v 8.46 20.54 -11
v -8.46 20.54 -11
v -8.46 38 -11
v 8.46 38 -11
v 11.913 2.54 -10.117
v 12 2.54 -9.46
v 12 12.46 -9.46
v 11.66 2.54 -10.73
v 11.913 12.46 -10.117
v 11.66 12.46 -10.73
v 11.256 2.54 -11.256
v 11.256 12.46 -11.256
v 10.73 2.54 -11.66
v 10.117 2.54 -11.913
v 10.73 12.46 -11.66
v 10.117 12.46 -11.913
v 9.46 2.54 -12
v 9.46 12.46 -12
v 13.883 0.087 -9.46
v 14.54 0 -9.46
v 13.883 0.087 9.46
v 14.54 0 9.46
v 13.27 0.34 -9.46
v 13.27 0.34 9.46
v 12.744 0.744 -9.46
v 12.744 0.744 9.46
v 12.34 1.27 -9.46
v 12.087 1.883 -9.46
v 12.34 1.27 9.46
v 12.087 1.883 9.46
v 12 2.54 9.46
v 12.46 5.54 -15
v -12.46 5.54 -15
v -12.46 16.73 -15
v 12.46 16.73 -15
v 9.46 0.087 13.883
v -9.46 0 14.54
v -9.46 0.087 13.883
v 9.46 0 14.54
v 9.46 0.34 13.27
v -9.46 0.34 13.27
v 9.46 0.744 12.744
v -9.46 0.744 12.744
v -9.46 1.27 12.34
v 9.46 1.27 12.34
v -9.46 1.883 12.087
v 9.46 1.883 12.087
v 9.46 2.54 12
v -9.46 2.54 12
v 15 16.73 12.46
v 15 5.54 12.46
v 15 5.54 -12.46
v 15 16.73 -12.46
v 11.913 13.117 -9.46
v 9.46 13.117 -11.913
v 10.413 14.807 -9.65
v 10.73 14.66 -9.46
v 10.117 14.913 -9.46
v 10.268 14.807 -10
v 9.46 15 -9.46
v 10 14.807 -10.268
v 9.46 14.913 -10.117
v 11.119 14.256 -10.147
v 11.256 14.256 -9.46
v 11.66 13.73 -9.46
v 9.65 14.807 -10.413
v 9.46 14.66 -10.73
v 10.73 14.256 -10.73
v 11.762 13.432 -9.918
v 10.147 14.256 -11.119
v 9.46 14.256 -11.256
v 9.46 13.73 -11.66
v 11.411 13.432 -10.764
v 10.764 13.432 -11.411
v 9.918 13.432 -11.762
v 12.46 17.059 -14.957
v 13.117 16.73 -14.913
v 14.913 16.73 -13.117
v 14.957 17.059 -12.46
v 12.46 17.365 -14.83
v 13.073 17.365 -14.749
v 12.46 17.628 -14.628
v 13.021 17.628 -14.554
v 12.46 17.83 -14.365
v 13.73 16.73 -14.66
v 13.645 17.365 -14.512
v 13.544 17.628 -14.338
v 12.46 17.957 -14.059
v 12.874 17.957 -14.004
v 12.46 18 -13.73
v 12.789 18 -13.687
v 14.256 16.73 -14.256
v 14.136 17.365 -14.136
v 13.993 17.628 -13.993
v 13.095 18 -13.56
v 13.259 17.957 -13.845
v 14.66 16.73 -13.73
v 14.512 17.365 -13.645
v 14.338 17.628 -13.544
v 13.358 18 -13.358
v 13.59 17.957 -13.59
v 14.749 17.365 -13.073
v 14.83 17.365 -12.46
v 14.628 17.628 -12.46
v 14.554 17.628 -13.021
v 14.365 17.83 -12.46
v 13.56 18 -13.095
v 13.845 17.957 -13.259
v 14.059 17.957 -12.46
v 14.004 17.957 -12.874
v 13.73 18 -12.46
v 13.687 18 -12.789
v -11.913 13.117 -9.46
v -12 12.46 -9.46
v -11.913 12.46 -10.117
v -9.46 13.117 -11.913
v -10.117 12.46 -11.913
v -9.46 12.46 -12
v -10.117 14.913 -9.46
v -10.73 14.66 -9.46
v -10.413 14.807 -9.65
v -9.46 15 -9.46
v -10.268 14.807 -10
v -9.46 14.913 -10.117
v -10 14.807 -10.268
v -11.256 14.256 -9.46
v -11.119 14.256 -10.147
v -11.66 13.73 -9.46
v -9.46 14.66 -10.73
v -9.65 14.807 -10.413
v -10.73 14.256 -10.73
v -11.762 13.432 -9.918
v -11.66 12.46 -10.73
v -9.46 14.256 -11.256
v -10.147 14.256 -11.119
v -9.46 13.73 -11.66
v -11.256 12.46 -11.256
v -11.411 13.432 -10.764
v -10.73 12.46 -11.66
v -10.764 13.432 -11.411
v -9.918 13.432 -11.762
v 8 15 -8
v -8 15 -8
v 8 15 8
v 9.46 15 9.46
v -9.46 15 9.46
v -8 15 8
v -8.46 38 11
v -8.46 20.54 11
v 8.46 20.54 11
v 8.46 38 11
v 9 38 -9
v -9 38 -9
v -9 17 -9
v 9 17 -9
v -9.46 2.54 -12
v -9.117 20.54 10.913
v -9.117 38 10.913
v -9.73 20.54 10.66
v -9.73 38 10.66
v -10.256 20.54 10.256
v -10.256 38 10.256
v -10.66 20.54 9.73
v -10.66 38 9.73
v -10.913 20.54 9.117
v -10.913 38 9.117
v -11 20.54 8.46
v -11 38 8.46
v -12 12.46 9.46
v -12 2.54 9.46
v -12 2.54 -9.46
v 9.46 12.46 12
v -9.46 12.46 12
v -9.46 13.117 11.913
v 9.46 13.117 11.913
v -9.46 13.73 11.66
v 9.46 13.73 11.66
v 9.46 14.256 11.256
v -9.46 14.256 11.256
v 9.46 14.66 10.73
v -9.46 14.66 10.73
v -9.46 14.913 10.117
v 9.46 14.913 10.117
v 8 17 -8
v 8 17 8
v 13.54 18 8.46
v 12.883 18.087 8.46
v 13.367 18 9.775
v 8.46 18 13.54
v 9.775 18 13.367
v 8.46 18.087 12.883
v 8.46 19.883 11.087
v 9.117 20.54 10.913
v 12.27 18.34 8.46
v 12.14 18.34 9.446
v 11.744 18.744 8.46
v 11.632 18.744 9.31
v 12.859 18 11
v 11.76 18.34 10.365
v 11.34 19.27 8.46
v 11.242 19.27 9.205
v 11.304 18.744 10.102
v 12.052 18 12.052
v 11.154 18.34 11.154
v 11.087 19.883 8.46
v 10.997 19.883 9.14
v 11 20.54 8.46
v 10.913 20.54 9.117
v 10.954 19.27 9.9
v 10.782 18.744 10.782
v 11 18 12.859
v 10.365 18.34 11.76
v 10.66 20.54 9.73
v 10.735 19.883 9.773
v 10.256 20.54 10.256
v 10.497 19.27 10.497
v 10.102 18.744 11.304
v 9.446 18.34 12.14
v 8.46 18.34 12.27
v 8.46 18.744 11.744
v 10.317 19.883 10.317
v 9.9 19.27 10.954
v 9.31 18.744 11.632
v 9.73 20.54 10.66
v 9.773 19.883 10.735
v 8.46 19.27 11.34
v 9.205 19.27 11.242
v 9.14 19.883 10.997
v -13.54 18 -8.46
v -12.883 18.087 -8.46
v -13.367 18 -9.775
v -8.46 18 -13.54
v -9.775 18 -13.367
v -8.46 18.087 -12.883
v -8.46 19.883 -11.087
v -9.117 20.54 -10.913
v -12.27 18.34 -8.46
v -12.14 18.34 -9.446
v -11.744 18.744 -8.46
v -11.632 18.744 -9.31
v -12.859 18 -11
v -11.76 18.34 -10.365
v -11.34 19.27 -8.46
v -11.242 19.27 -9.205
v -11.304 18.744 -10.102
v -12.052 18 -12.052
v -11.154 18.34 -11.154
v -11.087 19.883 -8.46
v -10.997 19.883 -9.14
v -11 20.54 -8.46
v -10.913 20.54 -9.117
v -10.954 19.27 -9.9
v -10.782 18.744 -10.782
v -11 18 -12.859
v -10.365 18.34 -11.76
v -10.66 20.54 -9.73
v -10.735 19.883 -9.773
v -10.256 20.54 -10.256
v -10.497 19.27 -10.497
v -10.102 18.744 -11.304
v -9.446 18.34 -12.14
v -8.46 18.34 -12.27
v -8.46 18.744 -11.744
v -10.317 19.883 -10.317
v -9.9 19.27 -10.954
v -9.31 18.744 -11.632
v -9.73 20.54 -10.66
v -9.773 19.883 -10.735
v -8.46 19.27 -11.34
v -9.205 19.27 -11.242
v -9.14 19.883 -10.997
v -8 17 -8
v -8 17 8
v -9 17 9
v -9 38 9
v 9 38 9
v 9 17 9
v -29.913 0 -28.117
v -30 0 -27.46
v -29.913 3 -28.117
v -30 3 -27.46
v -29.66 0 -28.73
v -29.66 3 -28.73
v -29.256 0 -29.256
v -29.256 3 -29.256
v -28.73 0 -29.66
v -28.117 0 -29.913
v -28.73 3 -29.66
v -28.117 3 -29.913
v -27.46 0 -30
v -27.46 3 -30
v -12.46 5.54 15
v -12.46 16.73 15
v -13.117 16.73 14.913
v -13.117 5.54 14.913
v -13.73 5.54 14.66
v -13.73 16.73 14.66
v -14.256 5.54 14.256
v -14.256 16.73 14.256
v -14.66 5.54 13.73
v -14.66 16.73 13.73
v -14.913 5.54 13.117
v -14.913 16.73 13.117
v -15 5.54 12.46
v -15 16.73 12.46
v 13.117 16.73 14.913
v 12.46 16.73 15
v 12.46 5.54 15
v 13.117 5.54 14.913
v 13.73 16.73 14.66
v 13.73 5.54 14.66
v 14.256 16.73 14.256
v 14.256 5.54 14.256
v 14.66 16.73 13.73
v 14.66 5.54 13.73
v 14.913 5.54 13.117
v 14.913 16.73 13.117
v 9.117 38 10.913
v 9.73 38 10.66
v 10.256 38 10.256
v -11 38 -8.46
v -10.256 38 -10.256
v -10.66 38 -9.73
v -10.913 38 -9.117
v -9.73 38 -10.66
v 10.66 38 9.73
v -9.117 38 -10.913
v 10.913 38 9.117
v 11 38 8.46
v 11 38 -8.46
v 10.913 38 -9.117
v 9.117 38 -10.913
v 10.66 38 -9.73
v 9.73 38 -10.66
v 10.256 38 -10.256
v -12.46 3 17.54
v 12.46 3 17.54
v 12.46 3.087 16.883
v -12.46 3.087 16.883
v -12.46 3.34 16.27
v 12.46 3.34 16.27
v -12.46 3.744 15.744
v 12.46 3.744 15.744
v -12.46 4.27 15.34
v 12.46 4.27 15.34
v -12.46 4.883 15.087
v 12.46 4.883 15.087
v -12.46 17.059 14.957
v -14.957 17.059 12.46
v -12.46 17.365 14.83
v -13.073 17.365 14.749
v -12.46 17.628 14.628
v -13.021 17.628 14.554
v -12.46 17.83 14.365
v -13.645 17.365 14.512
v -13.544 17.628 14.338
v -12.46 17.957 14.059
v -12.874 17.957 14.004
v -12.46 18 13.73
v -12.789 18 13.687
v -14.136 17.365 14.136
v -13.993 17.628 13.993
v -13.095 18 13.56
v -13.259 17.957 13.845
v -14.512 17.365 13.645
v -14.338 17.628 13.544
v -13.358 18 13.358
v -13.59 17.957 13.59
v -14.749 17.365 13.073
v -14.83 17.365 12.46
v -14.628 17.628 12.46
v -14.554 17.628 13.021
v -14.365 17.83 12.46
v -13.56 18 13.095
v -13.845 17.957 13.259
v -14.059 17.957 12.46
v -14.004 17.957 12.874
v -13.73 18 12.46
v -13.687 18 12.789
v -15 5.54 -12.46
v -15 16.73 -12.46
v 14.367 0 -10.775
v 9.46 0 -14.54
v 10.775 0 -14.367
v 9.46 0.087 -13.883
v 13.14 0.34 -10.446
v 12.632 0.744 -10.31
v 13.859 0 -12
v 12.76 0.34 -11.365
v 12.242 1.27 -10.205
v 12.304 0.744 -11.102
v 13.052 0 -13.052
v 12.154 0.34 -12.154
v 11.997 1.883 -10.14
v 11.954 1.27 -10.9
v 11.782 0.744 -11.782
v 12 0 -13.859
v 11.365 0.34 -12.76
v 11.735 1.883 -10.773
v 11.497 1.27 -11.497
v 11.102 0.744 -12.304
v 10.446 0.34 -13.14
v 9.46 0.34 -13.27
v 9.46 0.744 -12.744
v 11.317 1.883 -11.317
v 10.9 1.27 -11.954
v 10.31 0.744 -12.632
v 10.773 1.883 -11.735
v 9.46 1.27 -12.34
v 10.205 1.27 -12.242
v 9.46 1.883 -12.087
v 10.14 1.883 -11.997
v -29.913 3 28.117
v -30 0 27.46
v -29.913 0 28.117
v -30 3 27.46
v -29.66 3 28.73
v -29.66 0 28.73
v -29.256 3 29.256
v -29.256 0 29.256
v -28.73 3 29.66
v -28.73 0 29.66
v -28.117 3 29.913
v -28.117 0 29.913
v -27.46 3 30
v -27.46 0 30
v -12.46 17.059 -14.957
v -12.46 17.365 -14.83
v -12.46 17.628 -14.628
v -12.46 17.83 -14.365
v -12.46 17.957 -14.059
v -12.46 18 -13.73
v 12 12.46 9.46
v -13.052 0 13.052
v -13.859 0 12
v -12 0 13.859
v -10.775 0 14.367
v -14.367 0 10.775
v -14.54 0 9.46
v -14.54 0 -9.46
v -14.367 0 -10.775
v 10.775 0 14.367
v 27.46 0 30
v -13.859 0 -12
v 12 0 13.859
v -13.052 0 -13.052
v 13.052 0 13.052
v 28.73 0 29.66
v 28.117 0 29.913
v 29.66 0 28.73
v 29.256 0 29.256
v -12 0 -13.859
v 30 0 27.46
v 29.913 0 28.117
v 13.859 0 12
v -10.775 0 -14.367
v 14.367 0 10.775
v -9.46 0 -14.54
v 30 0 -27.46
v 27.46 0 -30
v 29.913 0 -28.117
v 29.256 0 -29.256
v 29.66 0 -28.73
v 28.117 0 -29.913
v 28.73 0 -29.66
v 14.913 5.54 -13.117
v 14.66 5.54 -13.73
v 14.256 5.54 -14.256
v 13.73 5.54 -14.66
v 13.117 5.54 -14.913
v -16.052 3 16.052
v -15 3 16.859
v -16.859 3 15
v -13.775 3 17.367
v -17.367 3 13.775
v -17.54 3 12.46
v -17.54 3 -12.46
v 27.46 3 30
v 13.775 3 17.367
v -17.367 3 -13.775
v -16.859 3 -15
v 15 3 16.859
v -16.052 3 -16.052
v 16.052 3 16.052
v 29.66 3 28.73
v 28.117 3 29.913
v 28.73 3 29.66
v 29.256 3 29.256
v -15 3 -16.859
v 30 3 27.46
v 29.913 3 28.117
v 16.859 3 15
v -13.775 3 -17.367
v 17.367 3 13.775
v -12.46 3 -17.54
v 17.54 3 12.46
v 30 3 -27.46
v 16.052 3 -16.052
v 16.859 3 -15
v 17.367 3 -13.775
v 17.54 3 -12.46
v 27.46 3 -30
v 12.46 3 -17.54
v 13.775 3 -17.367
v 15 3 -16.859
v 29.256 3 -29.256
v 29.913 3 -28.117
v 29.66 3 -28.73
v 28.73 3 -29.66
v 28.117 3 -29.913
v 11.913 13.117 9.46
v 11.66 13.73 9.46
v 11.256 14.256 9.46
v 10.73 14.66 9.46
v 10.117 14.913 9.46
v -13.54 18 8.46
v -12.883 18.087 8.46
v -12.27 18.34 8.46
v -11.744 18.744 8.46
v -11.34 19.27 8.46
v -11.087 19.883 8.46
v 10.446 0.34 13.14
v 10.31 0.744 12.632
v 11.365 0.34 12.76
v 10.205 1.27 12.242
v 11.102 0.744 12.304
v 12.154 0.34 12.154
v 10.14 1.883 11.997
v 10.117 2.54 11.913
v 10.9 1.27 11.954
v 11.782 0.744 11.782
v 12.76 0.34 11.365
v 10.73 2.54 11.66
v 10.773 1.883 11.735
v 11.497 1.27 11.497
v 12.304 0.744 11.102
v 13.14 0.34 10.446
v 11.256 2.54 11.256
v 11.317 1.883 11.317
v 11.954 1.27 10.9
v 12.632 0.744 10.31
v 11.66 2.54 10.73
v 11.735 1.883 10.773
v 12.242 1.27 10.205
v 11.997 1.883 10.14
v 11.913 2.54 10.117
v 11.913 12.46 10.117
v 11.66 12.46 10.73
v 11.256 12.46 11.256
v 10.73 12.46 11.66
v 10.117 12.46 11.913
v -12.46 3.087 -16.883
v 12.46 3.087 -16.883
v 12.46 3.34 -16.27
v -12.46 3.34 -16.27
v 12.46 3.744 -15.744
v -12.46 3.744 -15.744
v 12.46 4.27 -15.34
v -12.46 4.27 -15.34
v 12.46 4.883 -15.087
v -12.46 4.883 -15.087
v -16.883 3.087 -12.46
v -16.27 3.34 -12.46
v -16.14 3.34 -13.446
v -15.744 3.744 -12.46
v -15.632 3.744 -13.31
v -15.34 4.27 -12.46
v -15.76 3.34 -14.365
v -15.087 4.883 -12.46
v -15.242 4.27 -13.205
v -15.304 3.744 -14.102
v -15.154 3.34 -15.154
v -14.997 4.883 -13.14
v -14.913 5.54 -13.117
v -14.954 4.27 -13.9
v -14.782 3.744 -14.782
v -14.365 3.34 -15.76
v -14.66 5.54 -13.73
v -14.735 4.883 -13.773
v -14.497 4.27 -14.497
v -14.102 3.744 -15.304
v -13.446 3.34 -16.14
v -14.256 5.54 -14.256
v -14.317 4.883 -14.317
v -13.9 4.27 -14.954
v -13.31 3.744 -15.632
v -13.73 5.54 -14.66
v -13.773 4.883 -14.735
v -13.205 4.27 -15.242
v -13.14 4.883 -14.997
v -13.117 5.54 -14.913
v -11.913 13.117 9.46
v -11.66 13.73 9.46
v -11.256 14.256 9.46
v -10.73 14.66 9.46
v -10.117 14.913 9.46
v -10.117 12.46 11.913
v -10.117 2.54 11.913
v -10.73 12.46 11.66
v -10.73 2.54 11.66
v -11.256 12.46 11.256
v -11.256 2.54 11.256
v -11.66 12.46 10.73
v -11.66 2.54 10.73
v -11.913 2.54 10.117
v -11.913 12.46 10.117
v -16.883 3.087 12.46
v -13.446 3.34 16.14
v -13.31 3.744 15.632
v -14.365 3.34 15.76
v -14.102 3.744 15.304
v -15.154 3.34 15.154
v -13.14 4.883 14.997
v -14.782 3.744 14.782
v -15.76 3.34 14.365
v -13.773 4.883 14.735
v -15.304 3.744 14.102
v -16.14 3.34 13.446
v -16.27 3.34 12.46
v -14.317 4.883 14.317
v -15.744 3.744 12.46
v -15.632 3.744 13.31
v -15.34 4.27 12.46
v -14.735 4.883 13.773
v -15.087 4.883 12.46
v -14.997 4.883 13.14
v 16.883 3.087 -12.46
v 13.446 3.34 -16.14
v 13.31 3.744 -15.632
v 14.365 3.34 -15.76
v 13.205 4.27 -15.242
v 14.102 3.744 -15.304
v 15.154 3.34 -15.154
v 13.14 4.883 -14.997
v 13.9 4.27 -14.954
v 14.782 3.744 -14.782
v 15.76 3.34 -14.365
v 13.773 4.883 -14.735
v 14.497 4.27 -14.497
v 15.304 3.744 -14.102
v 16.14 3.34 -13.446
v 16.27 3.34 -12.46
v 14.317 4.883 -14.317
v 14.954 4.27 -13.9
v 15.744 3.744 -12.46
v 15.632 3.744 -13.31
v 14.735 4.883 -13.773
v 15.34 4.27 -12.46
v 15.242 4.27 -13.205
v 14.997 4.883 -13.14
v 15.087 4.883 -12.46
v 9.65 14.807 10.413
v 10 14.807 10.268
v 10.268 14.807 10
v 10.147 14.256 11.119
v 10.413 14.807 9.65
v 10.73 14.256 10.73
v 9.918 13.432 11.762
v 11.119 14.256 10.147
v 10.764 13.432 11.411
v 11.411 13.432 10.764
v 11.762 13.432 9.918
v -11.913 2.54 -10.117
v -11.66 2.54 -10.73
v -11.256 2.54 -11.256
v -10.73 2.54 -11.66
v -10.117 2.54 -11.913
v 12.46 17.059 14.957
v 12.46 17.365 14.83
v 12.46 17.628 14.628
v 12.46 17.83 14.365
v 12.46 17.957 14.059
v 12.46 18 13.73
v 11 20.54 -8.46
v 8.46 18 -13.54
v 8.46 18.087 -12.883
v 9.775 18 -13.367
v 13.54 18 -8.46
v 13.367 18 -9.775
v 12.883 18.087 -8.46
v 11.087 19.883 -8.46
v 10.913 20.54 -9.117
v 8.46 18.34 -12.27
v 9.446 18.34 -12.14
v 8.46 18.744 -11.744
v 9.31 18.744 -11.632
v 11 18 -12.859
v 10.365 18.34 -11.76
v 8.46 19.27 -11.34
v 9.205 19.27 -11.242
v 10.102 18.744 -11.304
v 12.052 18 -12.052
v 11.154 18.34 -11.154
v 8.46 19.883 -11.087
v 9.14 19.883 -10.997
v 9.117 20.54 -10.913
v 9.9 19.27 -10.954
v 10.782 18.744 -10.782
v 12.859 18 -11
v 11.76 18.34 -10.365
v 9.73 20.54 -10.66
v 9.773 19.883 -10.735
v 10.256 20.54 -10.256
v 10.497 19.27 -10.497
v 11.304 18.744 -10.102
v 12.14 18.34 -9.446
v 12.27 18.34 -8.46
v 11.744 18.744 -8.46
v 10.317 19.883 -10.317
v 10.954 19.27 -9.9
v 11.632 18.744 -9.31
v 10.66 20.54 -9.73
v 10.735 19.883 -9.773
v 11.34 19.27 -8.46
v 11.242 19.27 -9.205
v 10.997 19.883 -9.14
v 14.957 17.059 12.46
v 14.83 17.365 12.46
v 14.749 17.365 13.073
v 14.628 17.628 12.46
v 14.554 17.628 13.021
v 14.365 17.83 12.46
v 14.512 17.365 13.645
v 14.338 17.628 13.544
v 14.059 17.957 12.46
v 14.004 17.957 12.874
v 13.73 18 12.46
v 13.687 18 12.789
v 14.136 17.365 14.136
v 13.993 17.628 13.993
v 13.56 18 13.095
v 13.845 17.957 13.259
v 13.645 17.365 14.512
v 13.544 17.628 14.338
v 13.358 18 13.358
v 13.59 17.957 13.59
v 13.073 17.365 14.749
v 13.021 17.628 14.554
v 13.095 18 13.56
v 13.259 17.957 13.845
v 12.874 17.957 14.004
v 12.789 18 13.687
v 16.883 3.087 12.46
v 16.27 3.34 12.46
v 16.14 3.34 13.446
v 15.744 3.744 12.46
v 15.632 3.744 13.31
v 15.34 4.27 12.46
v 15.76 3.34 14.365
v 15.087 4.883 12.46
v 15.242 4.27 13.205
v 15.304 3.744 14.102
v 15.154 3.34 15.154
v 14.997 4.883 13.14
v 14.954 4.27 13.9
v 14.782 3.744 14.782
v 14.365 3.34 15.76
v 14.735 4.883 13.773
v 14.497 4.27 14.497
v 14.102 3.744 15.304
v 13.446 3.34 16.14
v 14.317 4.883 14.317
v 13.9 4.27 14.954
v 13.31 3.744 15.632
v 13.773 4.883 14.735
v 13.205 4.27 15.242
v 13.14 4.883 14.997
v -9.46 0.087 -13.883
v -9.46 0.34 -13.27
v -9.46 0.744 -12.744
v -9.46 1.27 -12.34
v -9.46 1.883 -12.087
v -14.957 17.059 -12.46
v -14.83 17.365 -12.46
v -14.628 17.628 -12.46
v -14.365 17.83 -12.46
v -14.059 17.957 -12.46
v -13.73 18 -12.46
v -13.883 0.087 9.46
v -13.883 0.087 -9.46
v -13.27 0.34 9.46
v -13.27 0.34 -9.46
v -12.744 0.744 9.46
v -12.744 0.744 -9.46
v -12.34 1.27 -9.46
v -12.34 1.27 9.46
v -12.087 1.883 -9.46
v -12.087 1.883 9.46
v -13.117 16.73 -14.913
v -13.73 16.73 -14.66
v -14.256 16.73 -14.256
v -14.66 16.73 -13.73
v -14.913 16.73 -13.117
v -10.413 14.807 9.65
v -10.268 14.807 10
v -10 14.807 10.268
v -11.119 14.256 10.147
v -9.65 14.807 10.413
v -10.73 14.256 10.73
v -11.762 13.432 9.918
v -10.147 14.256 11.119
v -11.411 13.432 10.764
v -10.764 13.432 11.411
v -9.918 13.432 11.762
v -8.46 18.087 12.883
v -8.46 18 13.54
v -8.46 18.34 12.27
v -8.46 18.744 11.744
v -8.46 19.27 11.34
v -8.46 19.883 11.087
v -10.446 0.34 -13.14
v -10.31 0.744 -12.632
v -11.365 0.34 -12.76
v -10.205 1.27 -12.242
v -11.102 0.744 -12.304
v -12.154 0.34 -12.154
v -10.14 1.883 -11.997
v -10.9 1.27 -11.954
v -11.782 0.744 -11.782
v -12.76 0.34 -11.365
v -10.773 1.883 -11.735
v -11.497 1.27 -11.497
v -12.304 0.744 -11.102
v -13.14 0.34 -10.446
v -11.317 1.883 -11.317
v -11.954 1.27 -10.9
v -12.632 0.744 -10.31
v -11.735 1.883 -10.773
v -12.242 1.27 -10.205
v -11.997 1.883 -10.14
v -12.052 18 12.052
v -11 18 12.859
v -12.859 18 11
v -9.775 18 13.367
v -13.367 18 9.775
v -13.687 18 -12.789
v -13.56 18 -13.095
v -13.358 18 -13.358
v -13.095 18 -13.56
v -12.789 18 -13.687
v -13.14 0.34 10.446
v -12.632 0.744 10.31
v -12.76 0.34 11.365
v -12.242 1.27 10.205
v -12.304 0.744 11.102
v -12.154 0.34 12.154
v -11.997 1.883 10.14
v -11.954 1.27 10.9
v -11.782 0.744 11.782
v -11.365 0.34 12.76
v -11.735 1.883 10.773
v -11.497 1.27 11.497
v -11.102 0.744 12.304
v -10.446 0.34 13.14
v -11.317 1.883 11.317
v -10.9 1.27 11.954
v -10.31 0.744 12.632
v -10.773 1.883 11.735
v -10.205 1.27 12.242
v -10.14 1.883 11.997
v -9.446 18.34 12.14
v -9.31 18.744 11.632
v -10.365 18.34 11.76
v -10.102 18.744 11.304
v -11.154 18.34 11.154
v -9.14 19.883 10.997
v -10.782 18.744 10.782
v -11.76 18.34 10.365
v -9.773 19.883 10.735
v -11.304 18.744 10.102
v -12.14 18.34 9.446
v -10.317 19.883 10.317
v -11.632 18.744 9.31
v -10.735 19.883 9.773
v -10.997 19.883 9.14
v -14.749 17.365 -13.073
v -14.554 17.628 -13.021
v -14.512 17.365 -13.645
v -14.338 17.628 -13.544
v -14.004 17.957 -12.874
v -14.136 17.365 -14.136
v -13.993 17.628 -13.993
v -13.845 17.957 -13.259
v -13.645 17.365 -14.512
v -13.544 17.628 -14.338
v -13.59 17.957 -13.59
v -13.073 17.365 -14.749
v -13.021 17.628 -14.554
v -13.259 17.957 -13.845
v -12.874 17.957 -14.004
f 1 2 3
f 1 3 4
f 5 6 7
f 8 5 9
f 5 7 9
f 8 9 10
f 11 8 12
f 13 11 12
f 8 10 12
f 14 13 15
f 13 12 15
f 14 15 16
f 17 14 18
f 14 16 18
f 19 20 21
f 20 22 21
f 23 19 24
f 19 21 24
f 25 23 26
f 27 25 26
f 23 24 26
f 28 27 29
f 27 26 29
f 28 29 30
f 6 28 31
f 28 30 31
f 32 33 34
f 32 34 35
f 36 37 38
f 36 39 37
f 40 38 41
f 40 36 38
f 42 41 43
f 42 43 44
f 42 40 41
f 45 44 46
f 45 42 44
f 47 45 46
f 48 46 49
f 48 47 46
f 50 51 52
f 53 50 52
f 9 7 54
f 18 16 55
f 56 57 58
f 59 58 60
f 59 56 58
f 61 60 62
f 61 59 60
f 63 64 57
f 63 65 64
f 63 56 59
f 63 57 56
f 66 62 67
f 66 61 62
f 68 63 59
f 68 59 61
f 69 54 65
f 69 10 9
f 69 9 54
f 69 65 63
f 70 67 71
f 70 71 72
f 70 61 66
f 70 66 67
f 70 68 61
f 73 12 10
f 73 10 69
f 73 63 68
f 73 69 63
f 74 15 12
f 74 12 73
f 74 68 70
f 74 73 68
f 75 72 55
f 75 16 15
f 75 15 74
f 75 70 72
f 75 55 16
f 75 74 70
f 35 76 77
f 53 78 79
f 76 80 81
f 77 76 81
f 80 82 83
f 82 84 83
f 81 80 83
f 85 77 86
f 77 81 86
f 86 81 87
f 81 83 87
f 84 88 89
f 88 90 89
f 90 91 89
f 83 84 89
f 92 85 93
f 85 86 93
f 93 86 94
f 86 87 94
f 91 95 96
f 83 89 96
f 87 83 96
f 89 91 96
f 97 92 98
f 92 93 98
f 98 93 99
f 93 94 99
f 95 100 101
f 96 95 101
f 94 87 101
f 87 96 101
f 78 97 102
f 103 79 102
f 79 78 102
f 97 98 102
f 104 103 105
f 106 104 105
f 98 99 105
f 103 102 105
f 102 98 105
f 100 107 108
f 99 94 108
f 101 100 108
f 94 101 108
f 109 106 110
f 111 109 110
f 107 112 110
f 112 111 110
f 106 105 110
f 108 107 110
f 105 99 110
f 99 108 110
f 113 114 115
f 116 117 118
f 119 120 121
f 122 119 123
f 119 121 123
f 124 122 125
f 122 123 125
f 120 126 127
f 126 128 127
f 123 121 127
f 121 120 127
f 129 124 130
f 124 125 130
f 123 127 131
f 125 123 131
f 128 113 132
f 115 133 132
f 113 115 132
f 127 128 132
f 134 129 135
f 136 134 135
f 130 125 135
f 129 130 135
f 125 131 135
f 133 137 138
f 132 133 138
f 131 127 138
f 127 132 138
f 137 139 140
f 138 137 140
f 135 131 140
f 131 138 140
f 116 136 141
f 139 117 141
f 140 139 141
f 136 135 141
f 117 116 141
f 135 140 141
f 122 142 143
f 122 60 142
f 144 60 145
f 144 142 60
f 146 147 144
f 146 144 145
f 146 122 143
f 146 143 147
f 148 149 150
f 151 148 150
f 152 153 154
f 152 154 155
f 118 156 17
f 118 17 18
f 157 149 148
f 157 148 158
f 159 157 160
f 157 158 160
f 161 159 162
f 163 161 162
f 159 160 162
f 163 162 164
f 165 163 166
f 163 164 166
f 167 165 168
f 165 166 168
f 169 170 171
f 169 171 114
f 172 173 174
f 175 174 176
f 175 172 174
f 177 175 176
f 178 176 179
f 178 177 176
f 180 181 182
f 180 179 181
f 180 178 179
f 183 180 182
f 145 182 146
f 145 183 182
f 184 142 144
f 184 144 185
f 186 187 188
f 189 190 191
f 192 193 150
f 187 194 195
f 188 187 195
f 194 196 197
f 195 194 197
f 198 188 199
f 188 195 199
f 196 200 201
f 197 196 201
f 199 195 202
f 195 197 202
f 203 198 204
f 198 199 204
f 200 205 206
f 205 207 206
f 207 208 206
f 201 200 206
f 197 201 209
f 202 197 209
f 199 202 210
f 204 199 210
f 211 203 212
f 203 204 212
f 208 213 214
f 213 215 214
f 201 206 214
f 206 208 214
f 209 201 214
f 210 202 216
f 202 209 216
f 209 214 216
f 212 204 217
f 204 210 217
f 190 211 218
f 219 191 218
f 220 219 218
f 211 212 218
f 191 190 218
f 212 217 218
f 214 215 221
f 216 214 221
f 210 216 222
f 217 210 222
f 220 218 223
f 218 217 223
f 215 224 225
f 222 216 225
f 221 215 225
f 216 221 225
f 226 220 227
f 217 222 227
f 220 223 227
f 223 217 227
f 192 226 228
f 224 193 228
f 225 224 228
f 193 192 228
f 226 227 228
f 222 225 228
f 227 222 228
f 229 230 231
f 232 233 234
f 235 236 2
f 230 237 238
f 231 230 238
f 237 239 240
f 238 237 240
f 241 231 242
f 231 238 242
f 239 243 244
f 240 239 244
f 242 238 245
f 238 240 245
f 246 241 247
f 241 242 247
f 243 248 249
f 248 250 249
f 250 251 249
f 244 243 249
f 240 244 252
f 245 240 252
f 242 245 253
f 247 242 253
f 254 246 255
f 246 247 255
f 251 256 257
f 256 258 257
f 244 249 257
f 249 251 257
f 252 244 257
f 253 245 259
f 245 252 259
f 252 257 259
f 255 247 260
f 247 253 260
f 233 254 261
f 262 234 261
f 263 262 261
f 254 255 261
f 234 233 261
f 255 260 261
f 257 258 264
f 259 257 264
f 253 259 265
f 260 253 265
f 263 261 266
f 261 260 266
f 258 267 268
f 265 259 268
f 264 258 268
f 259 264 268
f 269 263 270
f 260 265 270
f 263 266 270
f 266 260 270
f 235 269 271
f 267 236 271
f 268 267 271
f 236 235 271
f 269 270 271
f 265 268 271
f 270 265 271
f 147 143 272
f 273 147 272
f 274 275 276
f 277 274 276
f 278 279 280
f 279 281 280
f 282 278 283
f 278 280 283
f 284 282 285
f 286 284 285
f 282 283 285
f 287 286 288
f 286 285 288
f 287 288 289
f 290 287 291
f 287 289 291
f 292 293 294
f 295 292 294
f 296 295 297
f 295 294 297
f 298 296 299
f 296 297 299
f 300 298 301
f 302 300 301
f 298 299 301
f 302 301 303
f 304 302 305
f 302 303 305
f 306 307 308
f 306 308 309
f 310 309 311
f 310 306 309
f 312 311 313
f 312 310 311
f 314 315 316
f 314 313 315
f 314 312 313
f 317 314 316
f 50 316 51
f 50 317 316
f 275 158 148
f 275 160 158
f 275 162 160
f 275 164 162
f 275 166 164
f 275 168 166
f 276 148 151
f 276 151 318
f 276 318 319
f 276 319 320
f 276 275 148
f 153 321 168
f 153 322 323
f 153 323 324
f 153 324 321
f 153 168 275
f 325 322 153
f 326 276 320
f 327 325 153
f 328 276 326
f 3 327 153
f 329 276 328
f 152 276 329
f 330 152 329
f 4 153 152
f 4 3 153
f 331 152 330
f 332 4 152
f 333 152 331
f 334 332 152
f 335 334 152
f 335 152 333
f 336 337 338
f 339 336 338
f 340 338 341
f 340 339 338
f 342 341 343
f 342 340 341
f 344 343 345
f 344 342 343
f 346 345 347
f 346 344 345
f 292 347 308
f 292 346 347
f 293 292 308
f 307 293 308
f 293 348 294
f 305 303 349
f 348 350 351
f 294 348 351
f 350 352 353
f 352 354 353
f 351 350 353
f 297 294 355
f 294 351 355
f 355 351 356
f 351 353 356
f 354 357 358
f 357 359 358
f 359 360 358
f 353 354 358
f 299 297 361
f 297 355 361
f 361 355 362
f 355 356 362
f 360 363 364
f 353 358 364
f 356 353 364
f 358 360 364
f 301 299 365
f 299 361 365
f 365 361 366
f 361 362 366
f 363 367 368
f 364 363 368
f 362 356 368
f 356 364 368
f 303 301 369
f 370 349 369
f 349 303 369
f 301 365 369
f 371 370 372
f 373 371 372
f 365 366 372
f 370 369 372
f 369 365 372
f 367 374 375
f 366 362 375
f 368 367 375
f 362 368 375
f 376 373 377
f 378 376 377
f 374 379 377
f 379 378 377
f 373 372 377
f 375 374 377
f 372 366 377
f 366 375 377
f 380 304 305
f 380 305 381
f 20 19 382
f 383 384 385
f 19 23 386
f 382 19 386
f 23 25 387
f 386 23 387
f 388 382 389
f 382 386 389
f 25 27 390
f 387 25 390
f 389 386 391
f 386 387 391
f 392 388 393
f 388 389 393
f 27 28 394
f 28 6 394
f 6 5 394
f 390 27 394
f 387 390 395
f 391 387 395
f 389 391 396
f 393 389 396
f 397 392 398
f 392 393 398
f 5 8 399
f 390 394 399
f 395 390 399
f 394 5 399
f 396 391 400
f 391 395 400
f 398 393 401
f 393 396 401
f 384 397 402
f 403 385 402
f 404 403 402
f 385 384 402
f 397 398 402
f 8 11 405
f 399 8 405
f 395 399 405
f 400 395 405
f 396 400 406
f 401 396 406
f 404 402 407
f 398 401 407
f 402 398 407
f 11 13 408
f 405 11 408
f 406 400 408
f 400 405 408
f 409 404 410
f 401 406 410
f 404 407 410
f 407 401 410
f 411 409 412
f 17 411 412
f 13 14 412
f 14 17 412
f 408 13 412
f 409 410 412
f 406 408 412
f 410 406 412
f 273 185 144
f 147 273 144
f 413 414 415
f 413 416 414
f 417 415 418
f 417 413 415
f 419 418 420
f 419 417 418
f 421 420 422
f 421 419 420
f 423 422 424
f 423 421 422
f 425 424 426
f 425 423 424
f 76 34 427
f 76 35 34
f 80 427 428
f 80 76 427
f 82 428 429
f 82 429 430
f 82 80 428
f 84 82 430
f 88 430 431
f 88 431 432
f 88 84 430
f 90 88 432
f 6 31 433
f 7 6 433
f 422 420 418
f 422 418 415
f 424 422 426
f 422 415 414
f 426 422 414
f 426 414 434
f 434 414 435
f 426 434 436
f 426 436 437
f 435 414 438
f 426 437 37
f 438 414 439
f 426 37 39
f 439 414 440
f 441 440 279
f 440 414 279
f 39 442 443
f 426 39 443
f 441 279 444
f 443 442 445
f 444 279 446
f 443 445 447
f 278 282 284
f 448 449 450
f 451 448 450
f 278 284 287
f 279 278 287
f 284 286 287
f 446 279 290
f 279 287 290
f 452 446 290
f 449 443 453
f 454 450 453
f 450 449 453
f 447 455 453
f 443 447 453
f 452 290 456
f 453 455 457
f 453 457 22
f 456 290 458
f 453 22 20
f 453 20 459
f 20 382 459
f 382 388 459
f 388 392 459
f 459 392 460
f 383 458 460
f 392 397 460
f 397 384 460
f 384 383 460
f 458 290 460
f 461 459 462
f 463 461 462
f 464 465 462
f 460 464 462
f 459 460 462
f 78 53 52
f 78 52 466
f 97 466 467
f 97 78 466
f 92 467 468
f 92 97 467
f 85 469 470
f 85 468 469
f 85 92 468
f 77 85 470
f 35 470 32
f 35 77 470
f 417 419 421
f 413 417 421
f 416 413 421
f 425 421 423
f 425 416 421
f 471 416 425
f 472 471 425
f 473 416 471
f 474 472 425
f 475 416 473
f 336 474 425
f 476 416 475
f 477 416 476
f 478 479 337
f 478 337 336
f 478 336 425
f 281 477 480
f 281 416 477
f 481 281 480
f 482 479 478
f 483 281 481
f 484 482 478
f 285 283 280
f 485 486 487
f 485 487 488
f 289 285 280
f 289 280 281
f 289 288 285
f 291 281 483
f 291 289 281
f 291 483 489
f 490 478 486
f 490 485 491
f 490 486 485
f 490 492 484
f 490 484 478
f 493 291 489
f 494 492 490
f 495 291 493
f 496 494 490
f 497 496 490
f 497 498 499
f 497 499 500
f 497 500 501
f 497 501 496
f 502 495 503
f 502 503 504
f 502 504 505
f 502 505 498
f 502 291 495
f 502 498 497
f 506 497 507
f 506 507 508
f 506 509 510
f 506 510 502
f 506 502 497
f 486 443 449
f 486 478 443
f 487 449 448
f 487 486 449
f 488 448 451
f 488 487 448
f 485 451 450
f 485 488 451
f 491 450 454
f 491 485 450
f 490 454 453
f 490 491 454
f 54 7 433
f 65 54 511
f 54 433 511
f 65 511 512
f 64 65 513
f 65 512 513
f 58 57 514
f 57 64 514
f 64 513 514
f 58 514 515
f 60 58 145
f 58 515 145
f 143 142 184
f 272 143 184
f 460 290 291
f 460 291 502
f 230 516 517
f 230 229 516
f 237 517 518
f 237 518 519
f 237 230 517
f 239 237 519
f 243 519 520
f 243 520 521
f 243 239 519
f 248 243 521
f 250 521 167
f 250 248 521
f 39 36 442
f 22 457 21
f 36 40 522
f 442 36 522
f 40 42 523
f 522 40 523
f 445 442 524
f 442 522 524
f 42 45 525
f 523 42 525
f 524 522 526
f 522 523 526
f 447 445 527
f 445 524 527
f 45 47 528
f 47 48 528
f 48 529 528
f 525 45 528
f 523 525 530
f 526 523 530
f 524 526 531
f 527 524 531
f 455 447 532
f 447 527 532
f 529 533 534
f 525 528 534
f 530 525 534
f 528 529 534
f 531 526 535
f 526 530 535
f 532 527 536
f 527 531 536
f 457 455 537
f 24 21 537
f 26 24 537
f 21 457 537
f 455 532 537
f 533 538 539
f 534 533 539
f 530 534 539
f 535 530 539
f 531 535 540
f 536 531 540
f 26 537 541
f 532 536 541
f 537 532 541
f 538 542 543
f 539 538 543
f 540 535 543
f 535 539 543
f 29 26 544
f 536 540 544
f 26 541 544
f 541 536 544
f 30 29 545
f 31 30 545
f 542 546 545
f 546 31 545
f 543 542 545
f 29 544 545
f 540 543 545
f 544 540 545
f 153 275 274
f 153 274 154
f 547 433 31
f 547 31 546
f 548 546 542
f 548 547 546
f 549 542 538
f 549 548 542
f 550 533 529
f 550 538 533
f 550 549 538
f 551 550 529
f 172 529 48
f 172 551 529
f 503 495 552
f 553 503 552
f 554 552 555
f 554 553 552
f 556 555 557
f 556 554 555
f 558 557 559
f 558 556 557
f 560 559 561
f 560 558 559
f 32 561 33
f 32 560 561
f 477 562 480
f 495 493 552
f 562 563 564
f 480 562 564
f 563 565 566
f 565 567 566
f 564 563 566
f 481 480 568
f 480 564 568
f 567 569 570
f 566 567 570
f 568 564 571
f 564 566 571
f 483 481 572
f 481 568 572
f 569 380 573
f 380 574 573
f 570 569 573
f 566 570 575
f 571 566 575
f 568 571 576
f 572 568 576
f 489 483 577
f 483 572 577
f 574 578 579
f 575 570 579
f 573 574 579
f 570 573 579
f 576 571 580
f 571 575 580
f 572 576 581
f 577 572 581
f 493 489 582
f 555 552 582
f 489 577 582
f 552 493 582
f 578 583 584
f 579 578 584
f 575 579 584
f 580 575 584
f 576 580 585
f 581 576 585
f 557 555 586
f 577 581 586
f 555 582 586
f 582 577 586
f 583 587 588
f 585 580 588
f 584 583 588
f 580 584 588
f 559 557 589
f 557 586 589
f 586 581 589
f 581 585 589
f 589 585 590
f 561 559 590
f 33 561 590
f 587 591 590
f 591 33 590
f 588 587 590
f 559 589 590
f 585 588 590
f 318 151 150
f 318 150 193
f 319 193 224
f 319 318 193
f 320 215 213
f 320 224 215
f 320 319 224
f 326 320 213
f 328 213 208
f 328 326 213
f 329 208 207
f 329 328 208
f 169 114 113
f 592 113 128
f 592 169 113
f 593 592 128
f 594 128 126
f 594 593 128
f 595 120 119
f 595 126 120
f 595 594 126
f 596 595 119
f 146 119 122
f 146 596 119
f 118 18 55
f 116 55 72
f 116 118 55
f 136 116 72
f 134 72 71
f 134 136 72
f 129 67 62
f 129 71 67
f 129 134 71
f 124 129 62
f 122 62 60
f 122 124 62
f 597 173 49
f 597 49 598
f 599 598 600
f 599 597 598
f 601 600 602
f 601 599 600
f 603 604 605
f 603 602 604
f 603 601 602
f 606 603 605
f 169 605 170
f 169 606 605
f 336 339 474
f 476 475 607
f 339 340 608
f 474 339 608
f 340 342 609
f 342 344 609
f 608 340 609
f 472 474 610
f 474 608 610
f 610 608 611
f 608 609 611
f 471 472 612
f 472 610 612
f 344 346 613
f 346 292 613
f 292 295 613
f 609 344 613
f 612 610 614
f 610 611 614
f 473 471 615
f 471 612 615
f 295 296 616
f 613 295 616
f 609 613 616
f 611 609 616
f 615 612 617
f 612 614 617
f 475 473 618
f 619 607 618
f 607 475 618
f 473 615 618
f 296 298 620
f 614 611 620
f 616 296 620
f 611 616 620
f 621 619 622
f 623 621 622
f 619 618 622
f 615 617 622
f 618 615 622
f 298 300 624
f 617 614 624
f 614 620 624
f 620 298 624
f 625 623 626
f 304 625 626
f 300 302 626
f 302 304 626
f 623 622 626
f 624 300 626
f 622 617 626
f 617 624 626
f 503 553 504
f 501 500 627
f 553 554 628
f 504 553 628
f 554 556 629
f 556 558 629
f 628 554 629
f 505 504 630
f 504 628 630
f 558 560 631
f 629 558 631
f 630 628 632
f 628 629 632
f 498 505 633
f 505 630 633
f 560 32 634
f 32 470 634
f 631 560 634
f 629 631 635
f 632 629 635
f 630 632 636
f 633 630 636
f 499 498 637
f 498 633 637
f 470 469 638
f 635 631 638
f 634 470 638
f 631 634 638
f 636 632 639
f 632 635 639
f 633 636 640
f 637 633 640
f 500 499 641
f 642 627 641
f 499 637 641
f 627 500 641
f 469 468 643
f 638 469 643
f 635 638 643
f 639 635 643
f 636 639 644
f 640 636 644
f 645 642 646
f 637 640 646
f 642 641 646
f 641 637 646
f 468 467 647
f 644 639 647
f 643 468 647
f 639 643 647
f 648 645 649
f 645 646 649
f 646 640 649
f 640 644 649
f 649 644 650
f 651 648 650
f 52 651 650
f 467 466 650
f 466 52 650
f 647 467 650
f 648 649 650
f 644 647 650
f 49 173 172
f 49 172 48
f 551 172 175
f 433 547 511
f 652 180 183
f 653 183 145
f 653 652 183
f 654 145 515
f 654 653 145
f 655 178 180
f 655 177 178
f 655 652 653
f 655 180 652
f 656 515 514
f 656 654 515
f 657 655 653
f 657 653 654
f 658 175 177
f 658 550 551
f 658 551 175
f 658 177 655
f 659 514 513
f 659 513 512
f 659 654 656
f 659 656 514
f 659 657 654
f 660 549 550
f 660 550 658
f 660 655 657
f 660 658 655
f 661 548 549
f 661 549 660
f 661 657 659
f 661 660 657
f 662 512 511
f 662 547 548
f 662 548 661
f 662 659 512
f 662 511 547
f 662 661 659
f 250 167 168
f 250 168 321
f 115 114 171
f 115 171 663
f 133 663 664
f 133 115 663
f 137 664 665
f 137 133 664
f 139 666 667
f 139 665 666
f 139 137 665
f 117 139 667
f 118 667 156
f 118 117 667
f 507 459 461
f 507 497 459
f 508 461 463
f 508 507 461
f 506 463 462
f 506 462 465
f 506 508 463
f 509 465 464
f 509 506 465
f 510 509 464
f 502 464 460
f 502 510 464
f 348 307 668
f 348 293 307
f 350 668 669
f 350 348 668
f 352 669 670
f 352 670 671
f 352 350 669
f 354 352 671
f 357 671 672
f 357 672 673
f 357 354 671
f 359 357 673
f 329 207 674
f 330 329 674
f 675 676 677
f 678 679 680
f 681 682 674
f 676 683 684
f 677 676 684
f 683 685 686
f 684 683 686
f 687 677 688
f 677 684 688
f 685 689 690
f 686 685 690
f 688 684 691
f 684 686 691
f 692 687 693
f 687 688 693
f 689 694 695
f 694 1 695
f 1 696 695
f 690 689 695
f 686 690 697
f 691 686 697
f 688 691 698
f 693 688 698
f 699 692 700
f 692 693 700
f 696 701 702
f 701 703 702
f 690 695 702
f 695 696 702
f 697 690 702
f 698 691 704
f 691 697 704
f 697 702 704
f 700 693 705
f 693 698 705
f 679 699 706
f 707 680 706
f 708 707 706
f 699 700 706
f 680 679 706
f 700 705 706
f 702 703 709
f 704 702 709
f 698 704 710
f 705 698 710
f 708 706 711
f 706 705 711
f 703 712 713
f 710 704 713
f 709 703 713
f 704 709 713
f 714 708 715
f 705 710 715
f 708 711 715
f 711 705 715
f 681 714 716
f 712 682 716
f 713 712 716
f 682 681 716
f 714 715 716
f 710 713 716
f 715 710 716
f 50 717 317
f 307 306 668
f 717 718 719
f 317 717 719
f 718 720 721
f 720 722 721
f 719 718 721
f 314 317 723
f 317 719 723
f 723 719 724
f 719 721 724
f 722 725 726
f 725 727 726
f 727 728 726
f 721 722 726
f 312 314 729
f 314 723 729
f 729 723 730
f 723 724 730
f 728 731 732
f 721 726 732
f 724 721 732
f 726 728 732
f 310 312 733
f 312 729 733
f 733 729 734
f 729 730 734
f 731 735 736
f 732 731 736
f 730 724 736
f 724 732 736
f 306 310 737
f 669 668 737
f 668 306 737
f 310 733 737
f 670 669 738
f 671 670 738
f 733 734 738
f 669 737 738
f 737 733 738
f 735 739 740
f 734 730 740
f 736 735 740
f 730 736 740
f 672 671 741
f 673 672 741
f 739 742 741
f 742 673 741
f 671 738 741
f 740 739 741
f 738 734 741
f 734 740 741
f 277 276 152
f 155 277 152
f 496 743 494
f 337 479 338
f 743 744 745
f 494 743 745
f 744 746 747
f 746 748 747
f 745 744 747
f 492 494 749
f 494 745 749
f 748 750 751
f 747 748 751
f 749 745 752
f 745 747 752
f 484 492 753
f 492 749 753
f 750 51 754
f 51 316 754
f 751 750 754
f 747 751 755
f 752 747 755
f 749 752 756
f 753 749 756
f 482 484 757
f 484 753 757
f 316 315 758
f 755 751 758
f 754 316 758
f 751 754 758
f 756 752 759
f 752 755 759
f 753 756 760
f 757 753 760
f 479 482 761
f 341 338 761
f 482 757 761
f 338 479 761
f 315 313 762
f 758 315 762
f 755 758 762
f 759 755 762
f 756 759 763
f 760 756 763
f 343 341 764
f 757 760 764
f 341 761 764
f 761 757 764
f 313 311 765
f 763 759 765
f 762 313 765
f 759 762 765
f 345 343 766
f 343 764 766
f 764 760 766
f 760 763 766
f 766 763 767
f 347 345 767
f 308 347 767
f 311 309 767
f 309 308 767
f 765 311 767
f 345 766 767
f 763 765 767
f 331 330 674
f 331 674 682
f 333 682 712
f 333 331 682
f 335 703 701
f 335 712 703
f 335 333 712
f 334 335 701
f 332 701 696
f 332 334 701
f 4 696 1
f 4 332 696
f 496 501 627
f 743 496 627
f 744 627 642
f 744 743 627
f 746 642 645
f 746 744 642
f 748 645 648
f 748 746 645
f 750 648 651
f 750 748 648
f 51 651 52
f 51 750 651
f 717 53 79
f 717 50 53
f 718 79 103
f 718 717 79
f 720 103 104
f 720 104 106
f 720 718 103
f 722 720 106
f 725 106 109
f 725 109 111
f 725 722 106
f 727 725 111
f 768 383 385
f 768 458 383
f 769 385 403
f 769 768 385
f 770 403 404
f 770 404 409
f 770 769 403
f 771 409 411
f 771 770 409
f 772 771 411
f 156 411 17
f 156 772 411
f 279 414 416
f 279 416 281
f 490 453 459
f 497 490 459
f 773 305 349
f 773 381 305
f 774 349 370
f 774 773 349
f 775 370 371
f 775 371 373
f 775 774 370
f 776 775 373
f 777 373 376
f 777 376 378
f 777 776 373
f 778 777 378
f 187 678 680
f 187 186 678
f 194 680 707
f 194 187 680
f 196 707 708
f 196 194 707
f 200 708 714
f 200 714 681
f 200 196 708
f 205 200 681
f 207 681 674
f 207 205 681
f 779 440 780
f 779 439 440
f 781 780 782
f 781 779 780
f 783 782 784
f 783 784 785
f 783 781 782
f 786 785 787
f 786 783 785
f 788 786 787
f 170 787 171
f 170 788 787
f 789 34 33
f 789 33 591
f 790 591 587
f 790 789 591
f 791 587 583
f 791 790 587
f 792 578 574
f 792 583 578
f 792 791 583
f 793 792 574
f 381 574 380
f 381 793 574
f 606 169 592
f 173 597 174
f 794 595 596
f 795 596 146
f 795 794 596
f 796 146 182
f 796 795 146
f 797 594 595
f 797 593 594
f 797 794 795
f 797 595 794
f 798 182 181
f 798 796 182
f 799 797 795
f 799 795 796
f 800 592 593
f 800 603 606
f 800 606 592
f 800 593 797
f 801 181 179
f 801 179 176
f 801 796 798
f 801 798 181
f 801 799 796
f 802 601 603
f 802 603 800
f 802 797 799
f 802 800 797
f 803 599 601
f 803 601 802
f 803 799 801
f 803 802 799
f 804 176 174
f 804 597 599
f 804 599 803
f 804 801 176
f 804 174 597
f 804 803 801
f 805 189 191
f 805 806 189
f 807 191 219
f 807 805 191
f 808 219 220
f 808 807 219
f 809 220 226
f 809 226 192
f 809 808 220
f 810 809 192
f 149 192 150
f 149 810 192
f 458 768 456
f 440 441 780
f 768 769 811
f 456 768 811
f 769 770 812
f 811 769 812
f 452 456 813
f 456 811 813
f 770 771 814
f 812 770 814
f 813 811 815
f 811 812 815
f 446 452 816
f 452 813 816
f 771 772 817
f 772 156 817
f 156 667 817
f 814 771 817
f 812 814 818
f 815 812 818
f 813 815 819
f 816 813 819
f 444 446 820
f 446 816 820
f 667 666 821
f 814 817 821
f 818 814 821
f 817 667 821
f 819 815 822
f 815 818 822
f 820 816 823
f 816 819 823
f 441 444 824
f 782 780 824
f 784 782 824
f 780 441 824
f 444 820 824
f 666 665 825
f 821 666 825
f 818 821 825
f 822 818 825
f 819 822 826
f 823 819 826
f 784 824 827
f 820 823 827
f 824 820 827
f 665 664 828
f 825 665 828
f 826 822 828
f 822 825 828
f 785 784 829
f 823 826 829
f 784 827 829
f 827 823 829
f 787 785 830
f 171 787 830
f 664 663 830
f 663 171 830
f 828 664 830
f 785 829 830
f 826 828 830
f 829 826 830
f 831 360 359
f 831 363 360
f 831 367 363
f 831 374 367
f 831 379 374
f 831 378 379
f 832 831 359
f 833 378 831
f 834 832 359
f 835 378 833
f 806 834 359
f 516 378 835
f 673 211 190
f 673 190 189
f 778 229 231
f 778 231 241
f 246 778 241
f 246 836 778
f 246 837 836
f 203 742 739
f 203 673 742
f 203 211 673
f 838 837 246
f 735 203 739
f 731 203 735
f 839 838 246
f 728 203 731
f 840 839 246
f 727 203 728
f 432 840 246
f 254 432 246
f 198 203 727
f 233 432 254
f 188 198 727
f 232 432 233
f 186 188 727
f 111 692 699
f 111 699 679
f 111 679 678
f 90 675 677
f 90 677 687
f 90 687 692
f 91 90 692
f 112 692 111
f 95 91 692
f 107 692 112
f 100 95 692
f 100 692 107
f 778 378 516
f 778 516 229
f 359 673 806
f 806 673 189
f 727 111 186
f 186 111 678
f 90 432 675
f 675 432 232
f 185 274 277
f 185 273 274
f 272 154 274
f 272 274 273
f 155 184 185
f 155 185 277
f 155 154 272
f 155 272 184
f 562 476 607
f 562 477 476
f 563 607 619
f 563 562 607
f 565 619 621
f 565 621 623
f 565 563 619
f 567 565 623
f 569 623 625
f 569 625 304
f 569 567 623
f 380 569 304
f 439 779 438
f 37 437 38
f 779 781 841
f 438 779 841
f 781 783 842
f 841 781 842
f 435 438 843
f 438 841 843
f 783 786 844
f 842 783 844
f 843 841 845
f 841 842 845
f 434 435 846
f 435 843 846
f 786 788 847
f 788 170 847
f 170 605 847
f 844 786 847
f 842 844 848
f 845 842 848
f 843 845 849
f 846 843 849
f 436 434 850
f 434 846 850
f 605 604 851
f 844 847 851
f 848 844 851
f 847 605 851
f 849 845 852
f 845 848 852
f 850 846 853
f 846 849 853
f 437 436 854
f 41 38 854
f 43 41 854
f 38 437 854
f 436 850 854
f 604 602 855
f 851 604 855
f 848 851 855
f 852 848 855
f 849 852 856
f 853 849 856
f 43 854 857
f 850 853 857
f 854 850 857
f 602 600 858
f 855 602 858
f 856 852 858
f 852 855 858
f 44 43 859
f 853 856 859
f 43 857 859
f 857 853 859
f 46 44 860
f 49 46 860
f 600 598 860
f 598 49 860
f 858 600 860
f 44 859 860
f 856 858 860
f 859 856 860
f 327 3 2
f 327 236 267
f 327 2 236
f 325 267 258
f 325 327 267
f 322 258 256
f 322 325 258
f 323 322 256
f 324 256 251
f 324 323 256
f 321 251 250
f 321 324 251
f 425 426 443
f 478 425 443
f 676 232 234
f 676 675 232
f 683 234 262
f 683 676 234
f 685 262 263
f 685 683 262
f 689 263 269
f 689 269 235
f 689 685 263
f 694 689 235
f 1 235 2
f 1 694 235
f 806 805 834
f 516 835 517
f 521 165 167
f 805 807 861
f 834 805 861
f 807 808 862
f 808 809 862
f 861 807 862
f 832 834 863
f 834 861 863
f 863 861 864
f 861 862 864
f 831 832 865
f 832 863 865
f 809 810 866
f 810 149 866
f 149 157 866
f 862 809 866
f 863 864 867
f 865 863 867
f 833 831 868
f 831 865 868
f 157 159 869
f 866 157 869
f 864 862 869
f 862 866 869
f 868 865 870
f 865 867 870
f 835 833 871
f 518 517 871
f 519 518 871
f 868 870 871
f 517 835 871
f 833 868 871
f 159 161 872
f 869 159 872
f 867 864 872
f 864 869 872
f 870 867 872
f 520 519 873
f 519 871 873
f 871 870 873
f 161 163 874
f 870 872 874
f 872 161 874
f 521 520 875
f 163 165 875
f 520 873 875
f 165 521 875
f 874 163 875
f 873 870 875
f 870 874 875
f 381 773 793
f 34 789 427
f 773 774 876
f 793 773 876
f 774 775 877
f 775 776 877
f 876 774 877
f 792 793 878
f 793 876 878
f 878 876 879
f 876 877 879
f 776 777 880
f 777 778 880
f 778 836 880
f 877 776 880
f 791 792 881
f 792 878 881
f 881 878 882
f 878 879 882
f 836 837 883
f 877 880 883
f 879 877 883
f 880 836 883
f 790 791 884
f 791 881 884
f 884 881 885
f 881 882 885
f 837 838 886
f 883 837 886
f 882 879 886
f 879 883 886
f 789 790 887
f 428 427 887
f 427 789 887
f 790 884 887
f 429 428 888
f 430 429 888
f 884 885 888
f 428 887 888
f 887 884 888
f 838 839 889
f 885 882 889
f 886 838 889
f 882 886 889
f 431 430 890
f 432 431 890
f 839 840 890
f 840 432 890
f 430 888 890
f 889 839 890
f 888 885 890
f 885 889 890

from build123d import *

# Parameters (mm, degrees)
SKETCH1_W           = 60
SKETCH1_H           = 60
BOSS_EXTRUDE1_DEPTH = 3
SKETCH2_W           = 30
SKETCH2_H           = 30
BOSS_EXTRUDE2_DEPTH = 14.999999878
SKETCH3_W           = 22
SKETCH3_H           = 22
BOSS_EXTRUDE3_DEPTH = 19.999999944
SHELL1_START        = -8
SHELL1_DEPTH        = 16
SHELL1_START_2      = -12
SHELL1_2_OUTLINE_W  = 14.999999878
SHELL1_2_OUTLINE_H  = 24
SHELL1_2_DEPTH      = 24
SKETCH4_W           = 16
SKETCH4_H           = 16
CUT_EXTRUDE1_DEPTH  = 55.999999887
SKETCH5_W           = 18
SKETCH5_H           = 18
SKETCH5_W_2         = 16
SKETCH5_H_2         = 16
CUT_EXTRUDE2_DEPTH  = 21.000000066
FILLET2_R           = 2.54
FILLET3_R           = 2.54
FILLET4_R           = 1.27


# Read off the part's stored shape, not the designer's step: Shell1
with BuildPart() as part:
    # Sketch1 → Boss-Extrude1 (new body)
    with BuildSketch(Plane(origin=(0, 0, 0), x_dir=(1, 0, 0), z_dir=(0, 1, 0))):
        Rectangle(SKETCH1_W, SKETCH1_H)
    extrude(amount=BOSS_EXTRUDE1_DEPTH)

    # Sketch2 → Boss-Extrude2 (add)
    with BuildSketch(Plane(origin=(0, 3, 0), x_dir=(1, 0, 0), z_dir=(0, 1, 0))):
        Rectangle(SKETCH2_W, SKETCH2_H)
    extrude(amount=BOSS_EXTRUDE2_DEPTH)

    # Sketch3 → Boss-Extrude3 (add)
    with BuildSketch(Plane(origin=(0, 17.999999878, 0), x_dir=(1, 0, 0), z_dir=(0, 1, 0))):
        Rectangle(SKETCH3_W, SKETCH3_H)
    extrude(amount=BOSS_EXTRUDE3_DEPTH)

    # Shell1 outline → Shell1 (cut)
    with BuildSketch(Plane.YZ.offset(SHELL1_START)):
        Polygon((14.999999878, 12), (0, 12), (0, -12), (14.999999878, -12), (14.999999878, -8), (34.999999822, -8), (34.999999822, 8), (14.999999878, 8), align=None)
    extrude(amount=SHELL1_DEPTH, mode=Mode.SUBTRACT)

    # Shell1 2 outline → Shell1 2 (cut)
    with BuildSketch(Plane.YZ.offset(SHELL1_START_2)):
        with Locations((7.499999939, 0)):
            Rectangle(SHELL1_2_OUTLINE_W, SHELL1_2_OUTLINE_H)
    extrude(amount=SHELL1_2_DEPTH, mode=Mode.SUBTRACT)

    # Sketch4 → Cut-Extrude1 (cut, through all)
    with BuildSketch(Plane.XZ.offset(-34.999999822)):
        Rectangle(SKETCH4_W, SKETCH4_H)
    extrude(amount=-CUT_EXTRUDE1_DEPTH, mode=Mode.SUBTRACT)

    # Sketch5 → Cut-Extrude2 (cut)
    with BuildSketch(Plane(origin=(0, 37.999999822, 0), x_dir=(1, 0, 0), z_dir=(0, 1, 0))):
        Rectangle(SKETCH5_W, SKETCH5_H)
        Rectangle(SKETCH5_W_2, SKETCH5_H_2, mode=Mode.SUBTRACT)
    extrude(amount=-CUT_EXTRUDE2_DEPTH, mode=Mode.SUBTRACT)

    # Fillet2
    fillet2_edges = [part.edges().sort_by_distance(p)[0] for p in [
        (-12, 0, 0),
        (-12, 7.499999939, -12),
        (0, 0, 12),
        (-12, 7.499999939, 12),
        (12, 0, 0),
        (12, 7.499999939, 12),
        (0, 0, -12),
        (12, 7.499999939, -12),
        (-12, 14.999999878, 0),
        (0, 14.999999878, 12),
        (12, 14.999999878, 0),
        (0, 14.999999878, -12),
    ]]
    fillet(fillet2_edges, radius=FILLET2_R)

    # Fillet3
    fillet3_edges = [part.edges().sort_by_distance(p)[0] for p in [
        (-15, 10.499999939, -15),
        (-15, 10.499999939, 15),
        (15, 10.499999939, 15),
        (15, 10.499999939, -15),
        (-11, 27.99999985, -11),
        (-11, 27.99999985, 11),
        (11, 27.99999985, 11),
        (11, 27.99999985, -11),
        (-30, 1.5, -30),
        (30, 1.5, -30),
        (30, 1.5, 30),
        (-30, 1.5, 30),
    ]]
    fillet(fillet3_edges, radius=FILLET3_R)
    fillet3_2_edges = [part.edges().sort_by_distance(p)[0] for p in [
        (-15, 3, 0),
        (0, 3, 15),
        (15, 3, 0),
        (0, 3, -15),
        (-11, 17.999999878, 0),
        (0, 17.999999878, 11),
        (11, 17.999999878, 0),
        (0, 17.999999878, -11),
        (10.256051224, 17.999999878, -10.256051224),
        (-10.256051224, 17.999999878, -10.256051224),
        (10.256051224, 17.999999878, 10.256051224),
        (-10.256051224, 17.999999878, 10.256051224),
        (-14.256051224, 3, -14.256051224),
        (14.256051224, 3, -14.256051224),
        (14.256051224, 3, 14.256051224),
        (-14.256051224, 3, 14.256051224),
    ]]
    fillet(fillet3_2_edges, radius=FILLET3_R)

    # Fillet4
    fillet4_edges = [part.edges().sort_by_distance(p)[0] for p in [
        (-15, 17.999999878, 0),
        (0, 17.999999878, 15),
        (15, 17.999999878, 0),
        (0, 17.999999878, -15),
        (-14.256051224, 17.999999878, -14.256051224),
        (-14.256051224, 17.999999878, 14.256051224),
        (14.256051224, 17.999999878, 14.256051224),
        (14.256051224, 17.999999878, -14.256051224),
    ]]
    fillet(fillet4_edges, radius=FILLET4_R)


solid = part.part
